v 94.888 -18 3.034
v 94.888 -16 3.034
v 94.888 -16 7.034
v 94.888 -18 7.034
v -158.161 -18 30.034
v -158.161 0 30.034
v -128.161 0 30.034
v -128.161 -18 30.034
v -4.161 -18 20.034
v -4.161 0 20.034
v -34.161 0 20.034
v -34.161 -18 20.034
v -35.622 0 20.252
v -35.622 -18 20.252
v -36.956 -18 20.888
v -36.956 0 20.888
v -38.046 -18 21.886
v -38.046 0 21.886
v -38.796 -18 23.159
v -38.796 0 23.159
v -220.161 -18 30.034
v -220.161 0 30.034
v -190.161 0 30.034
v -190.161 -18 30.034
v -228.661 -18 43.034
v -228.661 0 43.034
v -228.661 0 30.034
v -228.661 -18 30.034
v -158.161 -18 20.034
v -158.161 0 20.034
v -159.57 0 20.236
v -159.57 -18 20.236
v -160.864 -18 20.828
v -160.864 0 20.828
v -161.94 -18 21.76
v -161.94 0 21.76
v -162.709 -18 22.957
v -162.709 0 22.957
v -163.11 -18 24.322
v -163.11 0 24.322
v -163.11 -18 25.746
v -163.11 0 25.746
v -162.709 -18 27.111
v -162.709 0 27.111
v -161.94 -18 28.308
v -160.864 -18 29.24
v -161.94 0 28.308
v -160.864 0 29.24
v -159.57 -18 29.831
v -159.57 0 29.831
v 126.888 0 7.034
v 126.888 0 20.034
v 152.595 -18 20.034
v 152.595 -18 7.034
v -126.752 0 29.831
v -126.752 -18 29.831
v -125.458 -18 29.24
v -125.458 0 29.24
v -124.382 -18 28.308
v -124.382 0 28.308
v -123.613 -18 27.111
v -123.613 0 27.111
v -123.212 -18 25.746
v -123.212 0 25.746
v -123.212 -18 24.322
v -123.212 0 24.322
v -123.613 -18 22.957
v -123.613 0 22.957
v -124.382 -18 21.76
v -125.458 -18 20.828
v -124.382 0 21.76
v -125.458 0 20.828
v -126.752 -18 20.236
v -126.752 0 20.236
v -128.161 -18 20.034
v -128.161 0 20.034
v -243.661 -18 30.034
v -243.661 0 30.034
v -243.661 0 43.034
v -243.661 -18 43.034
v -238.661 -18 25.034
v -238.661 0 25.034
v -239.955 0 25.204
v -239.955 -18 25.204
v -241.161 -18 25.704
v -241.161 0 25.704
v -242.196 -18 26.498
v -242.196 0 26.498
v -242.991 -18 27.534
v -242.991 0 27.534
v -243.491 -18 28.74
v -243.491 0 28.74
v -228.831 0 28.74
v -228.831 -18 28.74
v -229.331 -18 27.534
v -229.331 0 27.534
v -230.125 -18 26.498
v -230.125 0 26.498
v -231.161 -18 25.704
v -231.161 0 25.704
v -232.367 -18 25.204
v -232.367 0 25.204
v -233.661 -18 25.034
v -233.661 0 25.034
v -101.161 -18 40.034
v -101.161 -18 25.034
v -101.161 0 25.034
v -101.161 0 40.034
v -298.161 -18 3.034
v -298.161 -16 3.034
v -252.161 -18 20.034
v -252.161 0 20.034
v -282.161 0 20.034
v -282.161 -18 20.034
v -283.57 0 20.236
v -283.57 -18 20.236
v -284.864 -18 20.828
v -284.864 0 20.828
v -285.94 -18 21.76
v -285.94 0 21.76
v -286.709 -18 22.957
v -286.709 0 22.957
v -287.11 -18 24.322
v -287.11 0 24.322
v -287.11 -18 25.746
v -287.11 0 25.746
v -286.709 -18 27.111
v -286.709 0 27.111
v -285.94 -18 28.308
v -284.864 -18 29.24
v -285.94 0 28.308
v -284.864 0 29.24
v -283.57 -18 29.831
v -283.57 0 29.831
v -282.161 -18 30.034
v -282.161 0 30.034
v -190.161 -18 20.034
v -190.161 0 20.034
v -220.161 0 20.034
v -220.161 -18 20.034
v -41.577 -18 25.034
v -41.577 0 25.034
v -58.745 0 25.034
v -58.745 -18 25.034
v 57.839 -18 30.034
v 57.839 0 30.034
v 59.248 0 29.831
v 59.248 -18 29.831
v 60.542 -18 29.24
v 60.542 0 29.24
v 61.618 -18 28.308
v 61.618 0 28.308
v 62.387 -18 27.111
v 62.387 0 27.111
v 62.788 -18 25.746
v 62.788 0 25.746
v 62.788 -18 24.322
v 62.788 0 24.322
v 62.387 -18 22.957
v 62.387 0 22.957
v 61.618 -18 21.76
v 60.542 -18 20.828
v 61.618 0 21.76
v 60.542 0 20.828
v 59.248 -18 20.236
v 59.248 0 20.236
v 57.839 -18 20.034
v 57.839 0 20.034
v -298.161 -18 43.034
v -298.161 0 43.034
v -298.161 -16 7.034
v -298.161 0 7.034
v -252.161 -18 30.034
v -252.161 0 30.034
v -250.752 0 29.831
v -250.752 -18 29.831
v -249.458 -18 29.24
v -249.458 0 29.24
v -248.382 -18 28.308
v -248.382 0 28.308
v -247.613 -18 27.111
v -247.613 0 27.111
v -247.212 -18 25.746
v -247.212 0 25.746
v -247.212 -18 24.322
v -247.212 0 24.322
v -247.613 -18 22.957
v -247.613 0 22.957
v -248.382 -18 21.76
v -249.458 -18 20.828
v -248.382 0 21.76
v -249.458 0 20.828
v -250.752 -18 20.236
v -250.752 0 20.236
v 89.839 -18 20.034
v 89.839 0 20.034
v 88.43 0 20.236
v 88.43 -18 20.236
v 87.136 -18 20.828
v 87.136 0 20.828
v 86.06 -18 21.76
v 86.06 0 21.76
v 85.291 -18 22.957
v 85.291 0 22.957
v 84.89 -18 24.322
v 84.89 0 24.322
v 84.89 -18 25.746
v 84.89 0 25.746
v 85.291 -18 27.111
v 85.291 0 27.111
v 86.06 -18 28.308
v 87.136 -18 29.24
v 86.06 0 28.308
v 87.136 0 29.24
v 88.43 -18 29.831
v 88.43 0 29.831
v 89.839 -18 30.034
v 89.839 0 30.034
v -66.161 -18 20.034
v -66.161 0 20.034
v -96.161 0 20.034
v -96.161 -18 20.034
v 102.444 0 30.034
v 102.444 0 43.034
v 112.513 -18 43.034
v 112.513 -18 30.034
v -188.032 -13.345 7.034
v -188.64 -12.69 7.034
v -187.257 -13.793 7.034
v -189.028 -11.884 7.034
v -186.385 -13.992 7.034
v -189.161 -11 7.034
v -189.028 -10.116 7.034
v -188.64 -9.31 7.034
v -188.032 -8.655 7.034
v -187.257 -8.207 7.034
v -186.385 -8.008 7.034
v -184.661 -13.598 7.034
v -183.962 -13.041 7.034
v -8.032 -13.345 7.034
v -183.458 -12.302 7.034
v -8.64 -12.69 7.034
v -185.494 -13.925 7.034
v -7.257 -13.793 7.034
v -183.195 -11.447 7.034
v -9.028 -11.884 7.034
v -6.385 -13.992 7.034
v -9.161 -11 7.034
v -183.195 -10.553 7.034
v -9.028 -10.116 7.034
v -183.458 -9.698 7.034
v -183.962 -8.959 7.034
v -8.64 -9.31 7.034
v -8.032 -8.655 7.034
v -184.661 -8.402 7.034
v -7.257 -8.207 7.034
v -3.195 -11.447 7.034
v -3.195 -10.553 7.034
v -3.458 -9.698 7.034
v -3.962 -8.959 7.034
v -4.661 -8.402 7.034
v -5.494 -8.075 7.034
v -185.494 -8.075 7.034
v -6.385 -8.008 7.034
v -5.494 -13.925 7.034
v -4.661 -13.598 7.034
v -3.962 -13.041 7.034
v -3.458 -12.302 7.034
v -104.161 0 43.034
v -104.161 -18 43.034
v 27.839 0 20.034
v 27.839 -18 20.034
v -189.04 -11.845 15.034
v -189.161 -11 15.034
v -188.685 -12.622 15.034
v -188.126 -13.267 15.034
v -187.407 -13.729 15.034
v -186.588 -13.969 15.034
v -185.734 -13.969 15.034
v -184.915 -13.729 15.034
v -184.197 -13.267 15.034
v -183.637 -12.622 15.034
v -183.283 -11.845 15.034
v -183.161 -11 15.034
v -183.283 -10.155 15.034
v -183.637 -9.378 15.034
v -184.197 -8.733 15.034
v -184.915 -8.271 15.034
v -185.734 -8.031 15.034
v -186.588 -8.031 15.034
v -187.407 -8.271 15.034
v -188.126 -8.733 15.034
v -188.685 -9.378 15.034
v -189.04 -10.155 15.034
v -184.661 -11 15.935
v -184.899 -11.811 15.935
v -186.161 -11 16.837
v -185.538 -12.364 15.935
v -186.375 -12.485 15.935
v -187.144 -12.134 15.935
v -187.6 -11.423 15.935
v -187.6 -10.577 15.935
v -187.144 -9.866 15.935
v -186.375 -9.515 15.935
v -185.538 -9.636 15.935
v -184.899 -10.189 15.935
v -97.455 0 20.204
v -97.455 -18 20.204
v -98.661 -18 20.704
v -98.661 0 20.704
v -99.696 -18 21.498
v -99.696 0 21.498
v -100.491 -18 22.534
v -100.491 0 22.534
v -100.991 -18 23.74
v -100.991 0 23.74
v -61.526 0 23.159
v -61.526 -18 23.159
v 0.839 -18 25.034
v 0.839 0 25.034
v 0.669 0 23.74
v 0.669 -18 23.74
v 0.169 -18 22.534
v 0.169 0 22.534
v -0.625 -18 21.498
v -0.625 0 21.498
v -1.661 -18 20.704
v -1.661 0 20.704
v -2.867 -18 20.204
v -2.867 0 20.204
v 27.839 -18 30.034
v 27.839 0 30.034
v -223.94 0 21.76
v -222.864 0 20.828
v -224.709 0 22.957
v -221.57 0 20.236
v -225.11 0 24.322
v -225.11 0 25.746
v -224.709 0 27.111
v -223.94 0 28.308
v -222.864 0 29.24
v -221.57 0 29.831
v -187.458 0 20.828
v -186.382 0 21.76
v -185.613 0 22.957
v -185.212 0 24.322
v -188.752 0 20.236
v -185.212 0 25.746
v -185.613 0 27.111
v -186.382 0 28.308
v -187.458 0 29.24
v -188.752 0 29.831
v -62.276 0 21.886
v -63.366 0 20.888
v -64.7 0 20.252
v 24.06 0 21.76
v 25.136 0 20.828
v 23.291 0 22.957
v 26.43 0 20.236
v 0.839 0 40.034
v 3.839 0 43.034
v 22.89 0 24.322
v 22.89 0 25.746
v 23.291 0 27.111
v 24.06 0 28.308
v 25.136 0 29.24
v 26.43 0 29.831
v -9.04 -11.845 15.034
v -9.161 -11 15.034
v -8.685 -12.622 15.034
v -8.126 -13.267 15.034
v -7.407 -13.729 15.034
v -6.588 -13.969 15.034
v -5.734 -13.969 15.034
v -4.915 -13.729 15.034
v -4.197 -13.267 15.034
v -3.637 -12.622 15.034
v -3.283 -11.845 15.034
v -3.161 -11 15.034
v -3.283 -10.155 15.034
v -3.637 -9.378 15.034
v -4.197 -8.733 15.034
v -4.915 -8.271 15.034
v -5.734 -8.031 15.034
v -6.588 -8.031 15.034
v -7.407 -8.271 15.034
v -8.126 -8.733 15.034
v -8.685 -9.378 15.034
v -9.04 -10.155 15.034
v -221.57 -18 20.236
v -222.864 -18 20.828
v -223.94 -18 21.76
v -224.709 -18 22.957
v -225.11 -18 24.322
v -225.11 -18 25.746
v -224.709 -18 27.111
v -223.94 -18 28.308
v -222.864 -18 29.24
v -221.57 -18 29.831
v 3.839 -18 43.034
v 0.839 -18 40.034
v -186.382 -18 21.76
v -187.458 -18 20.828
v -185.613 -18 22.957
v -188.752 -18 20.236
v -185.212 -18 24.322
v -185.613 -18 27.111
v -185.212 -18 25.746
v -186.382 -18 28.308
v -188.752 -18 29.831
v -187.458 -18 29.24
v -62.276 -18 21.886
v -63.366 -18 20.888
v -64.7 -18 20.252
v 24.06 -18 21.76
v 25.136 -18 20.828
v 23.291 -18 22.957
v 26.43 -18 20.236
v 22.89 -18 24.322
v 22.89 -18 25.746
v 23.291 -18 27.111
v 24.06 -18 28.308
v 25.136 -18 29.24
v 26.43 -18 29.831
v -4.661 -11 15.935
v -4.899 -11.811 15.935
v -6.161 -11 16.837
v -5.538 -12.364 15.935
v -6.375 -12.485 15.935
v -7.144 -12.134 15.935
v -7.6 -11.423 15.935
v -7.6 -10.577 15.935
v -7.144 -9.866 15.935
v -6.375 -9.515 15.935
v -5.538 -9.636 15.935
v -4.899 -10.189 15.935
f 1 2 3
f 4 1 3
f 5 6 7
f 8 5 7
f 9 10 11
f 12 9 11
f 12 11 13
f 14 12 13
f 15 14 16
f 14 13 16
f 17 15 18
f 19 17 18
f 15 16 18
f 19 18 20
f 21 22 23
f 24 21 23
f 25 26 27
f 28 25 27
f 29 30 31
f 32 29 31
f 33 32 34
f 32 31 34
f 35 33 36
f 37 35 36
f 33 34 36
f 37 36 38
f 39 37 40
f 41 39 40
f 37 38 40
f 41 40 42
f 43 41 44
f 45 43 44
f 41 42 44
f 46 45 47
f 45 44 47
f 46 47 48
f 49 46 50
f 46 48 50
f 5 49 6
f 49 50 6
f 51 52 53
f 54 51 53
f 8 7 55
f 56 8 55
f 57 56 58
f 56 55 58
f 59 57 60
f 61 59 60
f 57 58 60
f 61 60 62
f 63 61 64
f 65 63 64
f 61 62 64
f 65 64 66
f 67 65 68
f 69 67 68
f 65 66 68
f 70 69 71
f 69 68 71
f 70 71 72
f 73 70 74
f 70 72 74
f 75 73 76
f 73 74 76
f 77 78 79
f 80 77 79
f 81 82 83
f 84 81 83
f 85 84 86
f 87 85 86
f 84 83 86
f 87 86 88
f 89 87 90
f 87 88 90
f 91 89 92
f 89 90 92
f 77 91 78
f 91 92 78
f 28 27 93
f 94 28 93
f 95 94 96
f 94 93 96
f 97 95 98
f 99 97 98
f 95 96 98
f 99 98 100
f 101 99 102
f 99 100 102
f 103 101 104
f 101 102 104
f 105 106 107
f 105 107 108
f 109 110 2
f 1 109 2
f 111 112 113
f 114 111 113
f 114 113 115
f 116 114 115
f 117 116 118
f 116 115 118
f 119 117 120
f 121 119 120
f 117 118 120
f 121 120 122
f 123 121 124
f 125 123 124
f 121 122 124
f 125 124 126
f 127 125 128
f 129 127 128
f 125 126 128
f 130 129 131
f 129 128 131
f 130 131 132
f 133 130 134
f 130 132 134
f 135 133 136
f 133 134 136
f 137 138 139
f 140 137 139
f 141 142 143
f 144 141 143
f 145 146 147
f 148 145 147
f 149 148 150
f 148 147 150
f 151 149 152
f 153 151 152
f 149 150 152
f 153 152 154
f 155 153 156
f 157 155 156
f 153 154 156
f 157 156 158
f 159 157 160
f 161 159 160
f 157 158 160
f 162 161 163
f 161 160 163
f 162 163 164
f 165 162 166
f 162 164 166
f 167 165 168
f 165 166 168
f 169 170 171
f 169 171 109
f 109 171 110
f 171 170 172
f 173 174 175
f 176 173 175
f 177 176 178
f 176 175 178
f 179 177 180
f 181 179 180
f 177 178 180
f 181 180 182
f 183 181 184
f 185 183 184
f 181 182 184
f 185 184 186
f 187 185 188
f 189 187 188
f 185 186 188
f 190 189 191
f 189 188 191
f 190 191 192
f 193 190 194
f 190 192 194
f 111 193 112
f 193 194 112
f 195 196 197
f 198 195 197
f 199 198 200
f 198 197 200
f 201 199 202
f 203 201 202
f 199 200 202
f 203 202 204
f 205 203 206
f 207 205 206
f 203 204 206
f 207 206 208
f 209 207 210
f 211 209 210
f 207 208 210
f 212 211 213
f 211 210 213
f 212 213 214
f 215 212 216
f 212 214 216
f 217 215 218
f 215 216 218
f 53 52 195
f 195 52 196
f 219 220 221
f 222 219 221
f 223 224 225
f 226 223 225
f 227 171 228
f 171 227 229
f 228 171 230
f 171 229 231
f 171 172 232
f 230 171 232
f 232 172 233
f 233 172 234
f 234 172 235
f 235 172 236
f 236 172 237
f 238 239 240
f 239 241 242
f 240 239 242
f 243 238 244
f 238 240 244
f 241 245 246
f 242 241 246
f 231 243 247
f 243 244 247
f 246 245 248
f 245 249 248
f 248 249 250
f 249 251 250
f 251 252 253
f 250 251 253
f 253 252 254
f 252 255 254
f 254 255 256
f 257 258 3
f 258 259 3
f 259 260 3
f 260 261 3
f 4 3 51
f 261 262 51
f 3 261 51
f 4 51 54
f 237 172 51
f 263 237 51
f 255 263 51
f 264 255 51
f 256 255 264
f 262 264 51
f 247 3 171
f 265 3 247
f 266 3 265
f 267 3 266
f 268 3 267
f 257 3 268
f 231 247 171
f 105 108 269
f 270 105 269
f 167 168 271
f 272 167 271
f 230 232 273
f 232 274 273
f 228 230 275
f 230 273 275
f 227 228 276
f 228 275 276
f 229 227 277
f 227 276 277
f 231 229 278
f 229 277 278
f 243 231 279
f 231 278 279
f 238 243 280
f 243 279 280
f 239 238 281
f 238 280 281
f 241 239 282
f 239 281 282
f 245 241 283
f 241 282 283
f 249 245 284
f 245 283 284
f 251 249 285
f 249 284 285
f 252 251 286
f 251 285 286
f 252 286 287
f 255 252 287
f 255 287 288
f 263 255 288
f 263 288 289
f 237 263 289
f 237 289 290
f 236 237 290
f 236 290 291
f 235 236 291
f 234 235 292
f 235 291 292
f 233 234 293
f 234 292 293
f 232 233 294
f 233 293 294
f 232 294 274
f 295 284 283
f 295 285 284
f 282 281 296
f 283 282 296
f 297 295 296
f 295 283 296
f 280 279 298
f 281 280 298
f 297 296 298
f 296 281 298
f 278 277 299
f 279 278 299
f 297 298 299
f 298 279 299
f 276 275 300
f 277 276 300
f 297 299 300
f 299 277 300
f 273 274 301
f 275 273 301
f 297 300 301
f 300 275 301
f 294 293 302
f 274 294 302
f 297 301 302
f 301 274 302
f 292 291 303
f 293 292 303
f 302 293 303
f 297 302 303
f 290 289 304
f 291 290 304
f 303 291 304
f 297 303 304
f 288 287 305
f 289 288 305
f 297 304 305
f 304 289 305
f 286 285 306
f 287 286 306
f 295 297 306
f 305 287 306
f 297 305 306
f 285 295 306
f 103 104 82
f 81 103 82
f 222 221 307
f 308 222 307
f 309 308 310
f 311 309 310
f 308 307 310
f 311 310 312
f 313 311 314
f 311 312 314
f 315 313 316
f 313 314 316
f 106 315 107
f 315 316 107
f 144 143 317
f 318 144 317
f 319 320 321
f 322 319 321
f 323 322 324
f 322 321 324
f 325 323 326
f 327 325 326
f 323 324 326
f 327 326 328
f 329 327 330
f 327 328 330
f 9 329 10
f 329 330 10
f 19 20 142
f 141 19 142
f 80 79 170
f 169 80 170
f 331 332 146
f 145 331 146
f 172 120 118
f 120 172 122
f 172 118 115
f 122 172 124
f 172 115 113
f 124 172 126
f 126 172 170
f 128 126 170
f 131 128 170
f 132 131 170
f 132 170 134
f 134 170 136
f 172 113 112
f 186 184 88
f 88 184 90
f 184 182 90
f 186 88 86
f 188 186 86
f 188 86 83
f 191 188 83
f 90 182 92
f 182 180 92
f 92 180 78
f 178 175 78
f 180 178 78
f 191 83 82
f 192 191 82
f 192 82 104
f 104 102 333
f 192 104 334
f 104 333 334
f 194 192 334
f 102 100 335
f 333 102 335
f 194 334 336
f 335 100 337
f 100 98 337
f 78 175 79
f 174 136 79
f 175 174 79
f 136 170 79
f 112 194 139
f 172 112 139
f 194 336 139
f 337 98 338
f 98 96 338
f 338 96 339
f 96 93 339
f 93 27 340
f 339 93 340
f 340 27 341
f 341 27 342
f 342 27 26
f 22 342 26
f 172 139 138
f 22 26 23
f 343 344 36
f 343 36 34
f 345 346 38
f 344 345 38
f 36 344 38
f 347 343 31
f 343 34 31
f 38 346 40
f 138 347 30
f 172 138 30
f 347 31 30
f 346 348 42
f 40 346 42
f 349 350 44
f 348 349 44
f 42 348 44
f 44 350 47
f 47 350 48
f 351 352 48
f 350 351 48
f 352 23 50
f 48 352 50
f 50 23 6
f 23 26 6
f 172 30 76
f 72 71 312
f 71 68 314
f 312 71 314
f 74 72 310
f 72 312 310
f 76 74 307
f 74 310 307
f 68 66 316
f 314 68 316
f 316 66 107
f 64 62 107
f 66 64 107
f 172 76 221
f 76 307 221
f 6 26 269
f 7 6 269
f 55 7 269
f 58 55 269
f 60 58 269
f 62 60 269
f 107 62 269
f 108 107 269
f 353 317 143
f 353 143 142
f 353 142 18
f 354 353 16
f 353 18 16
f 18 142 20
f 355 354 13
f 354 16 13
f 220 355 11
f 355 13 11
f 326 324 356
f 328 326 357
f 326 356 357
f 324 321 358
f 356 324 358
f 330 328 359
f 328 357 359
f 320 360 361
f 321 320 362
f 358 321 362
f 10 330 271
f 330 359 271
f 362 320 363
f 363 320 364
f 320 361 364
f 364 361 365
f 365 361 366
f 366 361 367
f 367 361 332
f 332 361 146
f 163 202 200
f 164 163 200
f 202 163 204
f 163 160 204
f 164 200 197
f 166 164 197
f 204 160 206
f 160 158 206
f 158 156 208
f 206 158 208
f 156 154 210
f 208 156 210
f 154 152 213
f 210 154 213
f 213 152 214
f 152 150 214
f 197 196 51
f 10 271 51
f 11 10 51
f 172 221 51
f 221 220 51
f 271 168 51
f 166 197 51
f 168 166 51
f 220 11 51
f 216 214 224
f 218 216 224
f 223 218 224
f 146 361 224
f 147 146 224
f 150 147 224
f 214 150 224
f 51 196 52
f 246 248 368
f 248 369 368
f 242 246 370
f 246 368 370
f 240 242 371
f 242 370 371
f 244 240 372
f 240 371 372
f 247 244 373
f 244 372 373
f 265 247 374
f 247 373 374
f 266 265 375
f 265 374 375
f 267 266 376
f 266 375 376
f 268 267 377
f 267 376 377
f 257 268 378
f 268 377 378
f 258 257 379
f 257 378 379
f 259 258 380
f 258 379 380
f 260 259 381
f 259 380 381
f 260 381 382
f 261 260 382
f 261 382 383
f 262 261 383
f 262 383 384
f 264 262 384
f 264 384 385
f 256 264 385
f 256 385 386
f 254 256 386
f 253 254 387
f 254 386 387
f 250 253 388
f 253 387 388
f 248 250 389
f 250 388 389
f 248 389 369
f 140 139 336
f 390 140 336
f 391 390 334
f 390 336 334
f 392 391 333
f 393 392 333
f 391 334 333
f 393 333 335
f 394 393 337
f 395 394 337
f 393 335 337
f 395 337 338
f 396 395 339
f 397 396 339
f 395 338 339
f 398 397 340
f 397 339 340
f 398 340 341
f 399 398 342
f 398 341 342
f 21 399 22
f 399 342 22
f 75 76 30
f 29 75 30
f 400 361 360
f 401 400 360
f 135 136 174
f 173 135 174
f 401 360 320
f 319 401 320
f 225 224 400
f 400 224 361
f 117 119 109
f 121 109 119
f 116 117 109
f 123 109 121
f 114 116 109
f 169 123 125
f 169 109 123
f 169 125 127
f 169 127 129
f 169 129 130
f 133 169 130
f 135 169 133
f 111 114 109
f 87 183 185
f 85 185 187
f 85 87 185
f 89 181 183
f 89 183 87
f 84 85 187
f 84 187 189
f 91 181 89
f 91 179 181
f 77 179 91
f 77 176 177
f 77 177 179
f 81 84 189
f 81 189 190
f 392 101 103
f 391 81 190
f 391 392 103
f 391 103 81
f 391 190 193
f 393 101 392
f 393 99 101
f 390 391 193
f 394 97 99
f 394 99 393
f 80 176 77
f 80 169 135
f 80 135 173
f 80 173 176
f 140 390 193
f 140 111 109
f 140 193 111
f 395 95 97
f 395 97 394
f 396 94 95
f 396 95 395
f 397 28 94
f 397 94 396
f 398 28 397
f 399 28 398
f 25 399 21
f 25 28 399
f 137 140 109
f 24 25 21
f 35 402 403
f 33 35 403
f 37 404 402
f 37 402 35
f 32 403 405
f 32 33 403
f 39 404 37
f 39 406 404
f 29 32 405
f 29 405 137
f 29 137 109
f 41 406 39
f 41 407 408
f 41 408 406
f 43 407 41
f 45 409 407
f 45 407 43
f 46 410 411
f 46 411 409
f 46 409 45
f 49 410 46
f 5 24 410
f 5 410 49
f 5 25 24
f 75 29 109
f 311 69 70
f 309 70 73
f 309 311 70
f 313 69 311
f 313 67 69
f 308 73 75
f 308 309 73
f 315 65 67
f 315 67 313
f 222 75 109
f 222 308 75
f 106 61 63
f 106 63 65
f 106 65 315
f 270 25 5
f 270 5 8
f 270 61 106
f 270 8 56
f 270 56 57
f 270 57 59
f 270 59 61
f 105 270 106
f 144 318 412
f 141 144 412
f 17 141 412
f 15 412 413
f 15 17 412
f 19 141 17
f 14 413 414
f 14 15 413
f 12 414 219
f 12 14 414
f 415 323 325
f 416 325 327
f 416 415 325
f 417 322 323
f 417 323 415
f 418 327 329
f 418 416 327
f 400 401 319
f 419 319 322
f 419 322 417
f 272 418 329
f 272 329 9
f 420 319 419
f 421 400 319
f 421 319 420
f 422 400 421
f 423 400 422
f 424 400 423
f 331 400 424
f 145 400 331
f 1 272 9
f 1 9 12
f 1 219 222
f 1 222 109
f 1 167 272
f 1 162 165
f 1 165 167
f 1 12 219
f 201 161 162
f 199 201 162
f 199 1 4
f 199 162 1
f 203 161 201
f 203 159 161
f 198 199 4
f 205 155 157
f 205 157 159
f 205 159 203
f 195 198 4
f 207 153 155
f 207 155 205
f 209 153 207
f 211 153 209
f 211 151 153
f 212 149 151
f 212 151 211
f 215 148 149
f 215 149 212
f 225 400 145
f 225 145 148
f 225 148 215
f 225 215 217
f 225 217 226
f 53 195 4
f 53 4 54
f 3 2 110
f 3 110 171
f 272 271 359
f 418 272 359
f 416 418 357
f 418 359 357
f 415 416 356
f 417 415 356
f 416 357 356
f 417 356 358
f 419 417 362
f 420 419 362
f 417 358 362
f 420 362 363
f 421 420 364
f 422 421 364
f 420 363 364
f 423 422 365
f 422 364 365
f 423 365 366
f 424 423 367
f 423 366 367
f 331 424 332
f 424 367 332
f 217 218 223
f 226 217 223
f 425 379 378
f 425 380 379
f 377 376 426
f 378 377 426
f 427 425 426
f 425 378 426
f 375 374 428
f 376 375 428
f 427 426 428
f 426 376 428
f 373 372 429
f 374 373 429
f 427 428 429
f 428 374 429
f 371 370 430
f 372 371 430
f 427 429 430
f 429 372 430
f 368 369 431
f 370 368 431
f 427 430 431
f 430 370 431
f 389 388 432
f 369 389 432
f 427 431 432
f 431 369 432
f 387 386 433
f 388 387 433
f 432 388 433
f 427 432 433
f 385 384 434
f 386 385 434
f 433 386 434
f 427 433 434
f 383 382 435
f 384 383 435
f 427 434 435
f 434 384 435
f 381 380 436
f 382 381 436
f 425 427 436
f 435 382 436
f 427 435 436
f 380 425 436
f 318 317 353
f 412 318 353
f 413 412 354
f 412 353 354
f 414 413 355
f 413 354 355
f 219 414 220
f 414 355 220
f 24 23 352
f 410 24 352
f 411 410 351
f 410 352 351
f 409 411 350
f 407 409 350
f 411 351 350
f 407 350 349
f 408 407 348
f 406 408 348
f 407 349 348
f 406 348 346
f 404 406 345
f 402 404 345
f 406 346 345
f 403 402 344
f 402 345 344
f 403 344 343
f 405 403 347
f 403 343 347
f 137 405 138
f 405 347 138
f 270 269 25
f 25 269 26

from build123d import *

# Parameters (mm, degrees)
F1_DEPTH = 18
F3_DEPTH = 25
F5_DEPTH = 18
F6_W     = 16
F6_H     = 4
F7_DEPTH = 600
F9_D     = 6
F9_DEPTH = 8
F9_TIP   = 1.8025818571


with BuildPart() as f1:
    # F0 (on Front) → F1 (new body)
    with BuildSketch(Plane.XZ):
        with BuildLine():
            Line((112.5127500061, 30.0339285255), (112.5127500061, 43.0339285255))
            Line((112.5127500061, 43.0339285255), (3.8390576642, 43.0339285255))
            Line((3.8390576642, 43.0339285255), (0.8390576642, 40.0339285255))
            Line((0.8390576642, 40.0339285255), (0.8390576642, 25.0339285255))
            ThreePointArc((0.8390576642, 25.0339285255), (-0.6254084298, 21.4983946196), (-4.1609423358, 20.0339285255))
            Line((-4.1609423358, 20.0339285255), (-34.1609423358, 20.0339285255))
            ThreePointArc((-34.1609423358, 20.0339285255), (-36.9560273076, 20.8881475376), (-38.7960663902, 23.1589285255))
            Line((-38.7960663902, 23.1589285255), (-41.5771408229, 25.0339285255))
            Line((-41.5771408229, 25.0339285255), (-58.7447438487, 25.0339285255))
            Line((-58.7447438487, 25.0339285255), (-61.5258182813, 23.1589285255))
            ThreePointArc((-61.5258182813, 23.1589285255), (-63.3658573639, 20.8881475376), (-66.1609423358, 20.0339285255))
            Line((-66.1609423358, 20.0339285255), (-96.1609423358, 20.0339285255))
            ThreePointArc((-96.1609423358, 20.0339285255), (-99.6964762417, 21.4983946196), (-101.1609423358, 25.0339285255))
            Line((-101.1609423358, 25.0339285255), (-101.1609423358, 40.0339285255))
            Line((-101.1609423358, 40.0339285255), (-104.1609423358, 43.0339285255))
            Line((-104.1609423358, 43.0339285255), (-228.6609423358, 43.0339285255))
            Line((-228.6609423358, 43.0339285255), (-228.6609423358, 30.0339285255))
            ThreePointArc((-228.6609423358, 30.0339285255), (-230.1254084298, 26.4983946196), (-233.6609423358, 25.0339285255))
            Line((-233.6609423358, 25.0339285255), (-238.6609423358, 25.0339285255))
            ThreePointArc((-238.6609423358, 25.0339285255), (-242.1964762417, 26.4983946196), (-243.6609423358, 30.0339285255))
            Line((-243.6609423358, 30.0339285255), (-243.6609423358, 43.0339285255))
            Line((-243.6609423358, 43.0339285255), (-298.1612311549, 43.0339285255))
            Line((-298.1612311549, 43.0339285255), (-298.1612311549, 3.0339285255))
            Line((-298.1612311549, 3.0339285255), (94.8881047238, 3.0339285255))
            Line((94.8881047238, 3.0339285255), (94.8881047238, 7.0339285255))
            Line((94.8881047238, 7.0339285255), (152.5947688451, 7.0339285255))
            Line((152.5947688451, 7.0339285255), (152.5947688451, 20.0339285255))
            Line((152.5947688451, 20.0339285255), (89.8390576642, 20.0339285255))
            ThreePointArc((89.8390576642, 20.0339285255), (84.8390576642, 25.0339285255), (89.8390576642, 30.0339285255))
            Line((89.8390576642, 30.0339285255), (112.5127500061, 30.0339285255))
        make_face()
        with BuildLine():
            ThreePointArc((-282.1609423358, 20.0339285255), (-287.1609423358, 25.0339285255), (-282.1609423358, 30.0339285255))
            Line((-282.1609423358, 30.0339285255), (-252.1609423358, 30.0339285255))
            ThreePointArc((-252.1609423358, 30.0339285255), (-247.1609423358, 25.0339285255), (-252.1609423358, 20.0339285255))
            Line((-252.1609423358, 20.0339285255), (-282.1609423358, 20.0339285255))
        make_face(mode=Mode.SUBTRACT)
        with BuildLine():
            ThreePointArc((-220.1609423358, 20.0339285255), (-225.1609423358, 25.0339285255), (-220.1609423358, 30.0339285255))
            Line((-220.1609423358, 30.0339285255), (-190.1609423358, 30.0339285255))
            ThreePointArc((-190.1609423358, 30.0339285255), (-185.1609423358, 25.0339285255), (-190.1609423358, 20.0339285255))
            Line((-190.1609423358, 20.0339285255), (-220.1609423358, 20.0339285255))
        make_face(mode=Mode.SUBTRACT)
        with BuildLine():
            ThreePointArc((-158.1609423358, 20.0339285255), (-163.1609423358, 25.0339285255), (-158.1609423358, 30.0339285255))
            Line((-158.1609423358, 30.0339285255), (-128.1609423358, 30.0339285255))
            ThreePointArc((-128.1609423358, 30.0339285255), (-123.1609423358, 25.0339285255), (-128.1609423358, 20.0339285255))
            Line((-128.1609423358, 20.0339285255), (-158.1609423358, 20.0339285255))
        make_face(mode=Mode.SUBTRACT)
        with BuildLine():
            ThreePointArc((27.8390576642, 20.0339285255), (22.8390576642, 25.0339285255), (27.8390576642, 30.0339285255))
            Line((27.8390576642, 30.0339285255), (57.8390576642, 30.0339285255))
            ThreePointArc((57.8390576642, 30.0339285255), (62.8390576642, 25.0339285255), (57.8390576642, 20.0339285255))
            Line((57.8390576642, 20.0339285255), (27.8390576642, 20.0339285255))
        make_face(mode=Mode.SUBTRACT)
    extrude(amount=F1_DEPTH)

    # F2 (on face) → F3 (cut)
    with BuildSketch(Plane.XY.offset(20.0339285255)):
        Polygon((152.5947688451, -18), (152.5947688451, 0), (126.8877688451, 0), align=None)
    extrude(amount=-F3_DEPTH, mode=Mode.SUBTRACT)

    # F4 (on face) → F5 (cut)
    with BuildSketch(Plane.XY.offset(43.0339285255)):
        Polygon((112.5127500061, -18), (112.5127500061, 0), (102.4437500061, 0), align=None)
    extrude(amount=-F5_DEPTH, mode=Mode.SUBTRACT)

    # F6 (on face) → F7 (cut)
    with BuildSketch(Plane.YZ.offset(94.8881047238)):
        with Locations((-8, 5.0339285255)):
            Rectangle(F6_W, F6_H)
    extrude(amount=-F7_DEPTH, mode=Mode.SUBTRACT)

    # F9
    with Locations(Plane(origin=(0, 0, 7.0339285255), x_dir=(1, 0, 0), z_dir=(0, 0, -1))):
        with Locations((-186.1612311549, 11), (-6.1612311549, 11)):
            Hole(F9_D / 2, depth=F9_DEPTH)
            with Locations((0, 0, -(F9_DEPTH + F9_TIP / 2))):  # 118° drill point
                Cone(0, F9_D / 2, F9_TIP, mode=Mode.SUBTRACT)


solid = f1.part
